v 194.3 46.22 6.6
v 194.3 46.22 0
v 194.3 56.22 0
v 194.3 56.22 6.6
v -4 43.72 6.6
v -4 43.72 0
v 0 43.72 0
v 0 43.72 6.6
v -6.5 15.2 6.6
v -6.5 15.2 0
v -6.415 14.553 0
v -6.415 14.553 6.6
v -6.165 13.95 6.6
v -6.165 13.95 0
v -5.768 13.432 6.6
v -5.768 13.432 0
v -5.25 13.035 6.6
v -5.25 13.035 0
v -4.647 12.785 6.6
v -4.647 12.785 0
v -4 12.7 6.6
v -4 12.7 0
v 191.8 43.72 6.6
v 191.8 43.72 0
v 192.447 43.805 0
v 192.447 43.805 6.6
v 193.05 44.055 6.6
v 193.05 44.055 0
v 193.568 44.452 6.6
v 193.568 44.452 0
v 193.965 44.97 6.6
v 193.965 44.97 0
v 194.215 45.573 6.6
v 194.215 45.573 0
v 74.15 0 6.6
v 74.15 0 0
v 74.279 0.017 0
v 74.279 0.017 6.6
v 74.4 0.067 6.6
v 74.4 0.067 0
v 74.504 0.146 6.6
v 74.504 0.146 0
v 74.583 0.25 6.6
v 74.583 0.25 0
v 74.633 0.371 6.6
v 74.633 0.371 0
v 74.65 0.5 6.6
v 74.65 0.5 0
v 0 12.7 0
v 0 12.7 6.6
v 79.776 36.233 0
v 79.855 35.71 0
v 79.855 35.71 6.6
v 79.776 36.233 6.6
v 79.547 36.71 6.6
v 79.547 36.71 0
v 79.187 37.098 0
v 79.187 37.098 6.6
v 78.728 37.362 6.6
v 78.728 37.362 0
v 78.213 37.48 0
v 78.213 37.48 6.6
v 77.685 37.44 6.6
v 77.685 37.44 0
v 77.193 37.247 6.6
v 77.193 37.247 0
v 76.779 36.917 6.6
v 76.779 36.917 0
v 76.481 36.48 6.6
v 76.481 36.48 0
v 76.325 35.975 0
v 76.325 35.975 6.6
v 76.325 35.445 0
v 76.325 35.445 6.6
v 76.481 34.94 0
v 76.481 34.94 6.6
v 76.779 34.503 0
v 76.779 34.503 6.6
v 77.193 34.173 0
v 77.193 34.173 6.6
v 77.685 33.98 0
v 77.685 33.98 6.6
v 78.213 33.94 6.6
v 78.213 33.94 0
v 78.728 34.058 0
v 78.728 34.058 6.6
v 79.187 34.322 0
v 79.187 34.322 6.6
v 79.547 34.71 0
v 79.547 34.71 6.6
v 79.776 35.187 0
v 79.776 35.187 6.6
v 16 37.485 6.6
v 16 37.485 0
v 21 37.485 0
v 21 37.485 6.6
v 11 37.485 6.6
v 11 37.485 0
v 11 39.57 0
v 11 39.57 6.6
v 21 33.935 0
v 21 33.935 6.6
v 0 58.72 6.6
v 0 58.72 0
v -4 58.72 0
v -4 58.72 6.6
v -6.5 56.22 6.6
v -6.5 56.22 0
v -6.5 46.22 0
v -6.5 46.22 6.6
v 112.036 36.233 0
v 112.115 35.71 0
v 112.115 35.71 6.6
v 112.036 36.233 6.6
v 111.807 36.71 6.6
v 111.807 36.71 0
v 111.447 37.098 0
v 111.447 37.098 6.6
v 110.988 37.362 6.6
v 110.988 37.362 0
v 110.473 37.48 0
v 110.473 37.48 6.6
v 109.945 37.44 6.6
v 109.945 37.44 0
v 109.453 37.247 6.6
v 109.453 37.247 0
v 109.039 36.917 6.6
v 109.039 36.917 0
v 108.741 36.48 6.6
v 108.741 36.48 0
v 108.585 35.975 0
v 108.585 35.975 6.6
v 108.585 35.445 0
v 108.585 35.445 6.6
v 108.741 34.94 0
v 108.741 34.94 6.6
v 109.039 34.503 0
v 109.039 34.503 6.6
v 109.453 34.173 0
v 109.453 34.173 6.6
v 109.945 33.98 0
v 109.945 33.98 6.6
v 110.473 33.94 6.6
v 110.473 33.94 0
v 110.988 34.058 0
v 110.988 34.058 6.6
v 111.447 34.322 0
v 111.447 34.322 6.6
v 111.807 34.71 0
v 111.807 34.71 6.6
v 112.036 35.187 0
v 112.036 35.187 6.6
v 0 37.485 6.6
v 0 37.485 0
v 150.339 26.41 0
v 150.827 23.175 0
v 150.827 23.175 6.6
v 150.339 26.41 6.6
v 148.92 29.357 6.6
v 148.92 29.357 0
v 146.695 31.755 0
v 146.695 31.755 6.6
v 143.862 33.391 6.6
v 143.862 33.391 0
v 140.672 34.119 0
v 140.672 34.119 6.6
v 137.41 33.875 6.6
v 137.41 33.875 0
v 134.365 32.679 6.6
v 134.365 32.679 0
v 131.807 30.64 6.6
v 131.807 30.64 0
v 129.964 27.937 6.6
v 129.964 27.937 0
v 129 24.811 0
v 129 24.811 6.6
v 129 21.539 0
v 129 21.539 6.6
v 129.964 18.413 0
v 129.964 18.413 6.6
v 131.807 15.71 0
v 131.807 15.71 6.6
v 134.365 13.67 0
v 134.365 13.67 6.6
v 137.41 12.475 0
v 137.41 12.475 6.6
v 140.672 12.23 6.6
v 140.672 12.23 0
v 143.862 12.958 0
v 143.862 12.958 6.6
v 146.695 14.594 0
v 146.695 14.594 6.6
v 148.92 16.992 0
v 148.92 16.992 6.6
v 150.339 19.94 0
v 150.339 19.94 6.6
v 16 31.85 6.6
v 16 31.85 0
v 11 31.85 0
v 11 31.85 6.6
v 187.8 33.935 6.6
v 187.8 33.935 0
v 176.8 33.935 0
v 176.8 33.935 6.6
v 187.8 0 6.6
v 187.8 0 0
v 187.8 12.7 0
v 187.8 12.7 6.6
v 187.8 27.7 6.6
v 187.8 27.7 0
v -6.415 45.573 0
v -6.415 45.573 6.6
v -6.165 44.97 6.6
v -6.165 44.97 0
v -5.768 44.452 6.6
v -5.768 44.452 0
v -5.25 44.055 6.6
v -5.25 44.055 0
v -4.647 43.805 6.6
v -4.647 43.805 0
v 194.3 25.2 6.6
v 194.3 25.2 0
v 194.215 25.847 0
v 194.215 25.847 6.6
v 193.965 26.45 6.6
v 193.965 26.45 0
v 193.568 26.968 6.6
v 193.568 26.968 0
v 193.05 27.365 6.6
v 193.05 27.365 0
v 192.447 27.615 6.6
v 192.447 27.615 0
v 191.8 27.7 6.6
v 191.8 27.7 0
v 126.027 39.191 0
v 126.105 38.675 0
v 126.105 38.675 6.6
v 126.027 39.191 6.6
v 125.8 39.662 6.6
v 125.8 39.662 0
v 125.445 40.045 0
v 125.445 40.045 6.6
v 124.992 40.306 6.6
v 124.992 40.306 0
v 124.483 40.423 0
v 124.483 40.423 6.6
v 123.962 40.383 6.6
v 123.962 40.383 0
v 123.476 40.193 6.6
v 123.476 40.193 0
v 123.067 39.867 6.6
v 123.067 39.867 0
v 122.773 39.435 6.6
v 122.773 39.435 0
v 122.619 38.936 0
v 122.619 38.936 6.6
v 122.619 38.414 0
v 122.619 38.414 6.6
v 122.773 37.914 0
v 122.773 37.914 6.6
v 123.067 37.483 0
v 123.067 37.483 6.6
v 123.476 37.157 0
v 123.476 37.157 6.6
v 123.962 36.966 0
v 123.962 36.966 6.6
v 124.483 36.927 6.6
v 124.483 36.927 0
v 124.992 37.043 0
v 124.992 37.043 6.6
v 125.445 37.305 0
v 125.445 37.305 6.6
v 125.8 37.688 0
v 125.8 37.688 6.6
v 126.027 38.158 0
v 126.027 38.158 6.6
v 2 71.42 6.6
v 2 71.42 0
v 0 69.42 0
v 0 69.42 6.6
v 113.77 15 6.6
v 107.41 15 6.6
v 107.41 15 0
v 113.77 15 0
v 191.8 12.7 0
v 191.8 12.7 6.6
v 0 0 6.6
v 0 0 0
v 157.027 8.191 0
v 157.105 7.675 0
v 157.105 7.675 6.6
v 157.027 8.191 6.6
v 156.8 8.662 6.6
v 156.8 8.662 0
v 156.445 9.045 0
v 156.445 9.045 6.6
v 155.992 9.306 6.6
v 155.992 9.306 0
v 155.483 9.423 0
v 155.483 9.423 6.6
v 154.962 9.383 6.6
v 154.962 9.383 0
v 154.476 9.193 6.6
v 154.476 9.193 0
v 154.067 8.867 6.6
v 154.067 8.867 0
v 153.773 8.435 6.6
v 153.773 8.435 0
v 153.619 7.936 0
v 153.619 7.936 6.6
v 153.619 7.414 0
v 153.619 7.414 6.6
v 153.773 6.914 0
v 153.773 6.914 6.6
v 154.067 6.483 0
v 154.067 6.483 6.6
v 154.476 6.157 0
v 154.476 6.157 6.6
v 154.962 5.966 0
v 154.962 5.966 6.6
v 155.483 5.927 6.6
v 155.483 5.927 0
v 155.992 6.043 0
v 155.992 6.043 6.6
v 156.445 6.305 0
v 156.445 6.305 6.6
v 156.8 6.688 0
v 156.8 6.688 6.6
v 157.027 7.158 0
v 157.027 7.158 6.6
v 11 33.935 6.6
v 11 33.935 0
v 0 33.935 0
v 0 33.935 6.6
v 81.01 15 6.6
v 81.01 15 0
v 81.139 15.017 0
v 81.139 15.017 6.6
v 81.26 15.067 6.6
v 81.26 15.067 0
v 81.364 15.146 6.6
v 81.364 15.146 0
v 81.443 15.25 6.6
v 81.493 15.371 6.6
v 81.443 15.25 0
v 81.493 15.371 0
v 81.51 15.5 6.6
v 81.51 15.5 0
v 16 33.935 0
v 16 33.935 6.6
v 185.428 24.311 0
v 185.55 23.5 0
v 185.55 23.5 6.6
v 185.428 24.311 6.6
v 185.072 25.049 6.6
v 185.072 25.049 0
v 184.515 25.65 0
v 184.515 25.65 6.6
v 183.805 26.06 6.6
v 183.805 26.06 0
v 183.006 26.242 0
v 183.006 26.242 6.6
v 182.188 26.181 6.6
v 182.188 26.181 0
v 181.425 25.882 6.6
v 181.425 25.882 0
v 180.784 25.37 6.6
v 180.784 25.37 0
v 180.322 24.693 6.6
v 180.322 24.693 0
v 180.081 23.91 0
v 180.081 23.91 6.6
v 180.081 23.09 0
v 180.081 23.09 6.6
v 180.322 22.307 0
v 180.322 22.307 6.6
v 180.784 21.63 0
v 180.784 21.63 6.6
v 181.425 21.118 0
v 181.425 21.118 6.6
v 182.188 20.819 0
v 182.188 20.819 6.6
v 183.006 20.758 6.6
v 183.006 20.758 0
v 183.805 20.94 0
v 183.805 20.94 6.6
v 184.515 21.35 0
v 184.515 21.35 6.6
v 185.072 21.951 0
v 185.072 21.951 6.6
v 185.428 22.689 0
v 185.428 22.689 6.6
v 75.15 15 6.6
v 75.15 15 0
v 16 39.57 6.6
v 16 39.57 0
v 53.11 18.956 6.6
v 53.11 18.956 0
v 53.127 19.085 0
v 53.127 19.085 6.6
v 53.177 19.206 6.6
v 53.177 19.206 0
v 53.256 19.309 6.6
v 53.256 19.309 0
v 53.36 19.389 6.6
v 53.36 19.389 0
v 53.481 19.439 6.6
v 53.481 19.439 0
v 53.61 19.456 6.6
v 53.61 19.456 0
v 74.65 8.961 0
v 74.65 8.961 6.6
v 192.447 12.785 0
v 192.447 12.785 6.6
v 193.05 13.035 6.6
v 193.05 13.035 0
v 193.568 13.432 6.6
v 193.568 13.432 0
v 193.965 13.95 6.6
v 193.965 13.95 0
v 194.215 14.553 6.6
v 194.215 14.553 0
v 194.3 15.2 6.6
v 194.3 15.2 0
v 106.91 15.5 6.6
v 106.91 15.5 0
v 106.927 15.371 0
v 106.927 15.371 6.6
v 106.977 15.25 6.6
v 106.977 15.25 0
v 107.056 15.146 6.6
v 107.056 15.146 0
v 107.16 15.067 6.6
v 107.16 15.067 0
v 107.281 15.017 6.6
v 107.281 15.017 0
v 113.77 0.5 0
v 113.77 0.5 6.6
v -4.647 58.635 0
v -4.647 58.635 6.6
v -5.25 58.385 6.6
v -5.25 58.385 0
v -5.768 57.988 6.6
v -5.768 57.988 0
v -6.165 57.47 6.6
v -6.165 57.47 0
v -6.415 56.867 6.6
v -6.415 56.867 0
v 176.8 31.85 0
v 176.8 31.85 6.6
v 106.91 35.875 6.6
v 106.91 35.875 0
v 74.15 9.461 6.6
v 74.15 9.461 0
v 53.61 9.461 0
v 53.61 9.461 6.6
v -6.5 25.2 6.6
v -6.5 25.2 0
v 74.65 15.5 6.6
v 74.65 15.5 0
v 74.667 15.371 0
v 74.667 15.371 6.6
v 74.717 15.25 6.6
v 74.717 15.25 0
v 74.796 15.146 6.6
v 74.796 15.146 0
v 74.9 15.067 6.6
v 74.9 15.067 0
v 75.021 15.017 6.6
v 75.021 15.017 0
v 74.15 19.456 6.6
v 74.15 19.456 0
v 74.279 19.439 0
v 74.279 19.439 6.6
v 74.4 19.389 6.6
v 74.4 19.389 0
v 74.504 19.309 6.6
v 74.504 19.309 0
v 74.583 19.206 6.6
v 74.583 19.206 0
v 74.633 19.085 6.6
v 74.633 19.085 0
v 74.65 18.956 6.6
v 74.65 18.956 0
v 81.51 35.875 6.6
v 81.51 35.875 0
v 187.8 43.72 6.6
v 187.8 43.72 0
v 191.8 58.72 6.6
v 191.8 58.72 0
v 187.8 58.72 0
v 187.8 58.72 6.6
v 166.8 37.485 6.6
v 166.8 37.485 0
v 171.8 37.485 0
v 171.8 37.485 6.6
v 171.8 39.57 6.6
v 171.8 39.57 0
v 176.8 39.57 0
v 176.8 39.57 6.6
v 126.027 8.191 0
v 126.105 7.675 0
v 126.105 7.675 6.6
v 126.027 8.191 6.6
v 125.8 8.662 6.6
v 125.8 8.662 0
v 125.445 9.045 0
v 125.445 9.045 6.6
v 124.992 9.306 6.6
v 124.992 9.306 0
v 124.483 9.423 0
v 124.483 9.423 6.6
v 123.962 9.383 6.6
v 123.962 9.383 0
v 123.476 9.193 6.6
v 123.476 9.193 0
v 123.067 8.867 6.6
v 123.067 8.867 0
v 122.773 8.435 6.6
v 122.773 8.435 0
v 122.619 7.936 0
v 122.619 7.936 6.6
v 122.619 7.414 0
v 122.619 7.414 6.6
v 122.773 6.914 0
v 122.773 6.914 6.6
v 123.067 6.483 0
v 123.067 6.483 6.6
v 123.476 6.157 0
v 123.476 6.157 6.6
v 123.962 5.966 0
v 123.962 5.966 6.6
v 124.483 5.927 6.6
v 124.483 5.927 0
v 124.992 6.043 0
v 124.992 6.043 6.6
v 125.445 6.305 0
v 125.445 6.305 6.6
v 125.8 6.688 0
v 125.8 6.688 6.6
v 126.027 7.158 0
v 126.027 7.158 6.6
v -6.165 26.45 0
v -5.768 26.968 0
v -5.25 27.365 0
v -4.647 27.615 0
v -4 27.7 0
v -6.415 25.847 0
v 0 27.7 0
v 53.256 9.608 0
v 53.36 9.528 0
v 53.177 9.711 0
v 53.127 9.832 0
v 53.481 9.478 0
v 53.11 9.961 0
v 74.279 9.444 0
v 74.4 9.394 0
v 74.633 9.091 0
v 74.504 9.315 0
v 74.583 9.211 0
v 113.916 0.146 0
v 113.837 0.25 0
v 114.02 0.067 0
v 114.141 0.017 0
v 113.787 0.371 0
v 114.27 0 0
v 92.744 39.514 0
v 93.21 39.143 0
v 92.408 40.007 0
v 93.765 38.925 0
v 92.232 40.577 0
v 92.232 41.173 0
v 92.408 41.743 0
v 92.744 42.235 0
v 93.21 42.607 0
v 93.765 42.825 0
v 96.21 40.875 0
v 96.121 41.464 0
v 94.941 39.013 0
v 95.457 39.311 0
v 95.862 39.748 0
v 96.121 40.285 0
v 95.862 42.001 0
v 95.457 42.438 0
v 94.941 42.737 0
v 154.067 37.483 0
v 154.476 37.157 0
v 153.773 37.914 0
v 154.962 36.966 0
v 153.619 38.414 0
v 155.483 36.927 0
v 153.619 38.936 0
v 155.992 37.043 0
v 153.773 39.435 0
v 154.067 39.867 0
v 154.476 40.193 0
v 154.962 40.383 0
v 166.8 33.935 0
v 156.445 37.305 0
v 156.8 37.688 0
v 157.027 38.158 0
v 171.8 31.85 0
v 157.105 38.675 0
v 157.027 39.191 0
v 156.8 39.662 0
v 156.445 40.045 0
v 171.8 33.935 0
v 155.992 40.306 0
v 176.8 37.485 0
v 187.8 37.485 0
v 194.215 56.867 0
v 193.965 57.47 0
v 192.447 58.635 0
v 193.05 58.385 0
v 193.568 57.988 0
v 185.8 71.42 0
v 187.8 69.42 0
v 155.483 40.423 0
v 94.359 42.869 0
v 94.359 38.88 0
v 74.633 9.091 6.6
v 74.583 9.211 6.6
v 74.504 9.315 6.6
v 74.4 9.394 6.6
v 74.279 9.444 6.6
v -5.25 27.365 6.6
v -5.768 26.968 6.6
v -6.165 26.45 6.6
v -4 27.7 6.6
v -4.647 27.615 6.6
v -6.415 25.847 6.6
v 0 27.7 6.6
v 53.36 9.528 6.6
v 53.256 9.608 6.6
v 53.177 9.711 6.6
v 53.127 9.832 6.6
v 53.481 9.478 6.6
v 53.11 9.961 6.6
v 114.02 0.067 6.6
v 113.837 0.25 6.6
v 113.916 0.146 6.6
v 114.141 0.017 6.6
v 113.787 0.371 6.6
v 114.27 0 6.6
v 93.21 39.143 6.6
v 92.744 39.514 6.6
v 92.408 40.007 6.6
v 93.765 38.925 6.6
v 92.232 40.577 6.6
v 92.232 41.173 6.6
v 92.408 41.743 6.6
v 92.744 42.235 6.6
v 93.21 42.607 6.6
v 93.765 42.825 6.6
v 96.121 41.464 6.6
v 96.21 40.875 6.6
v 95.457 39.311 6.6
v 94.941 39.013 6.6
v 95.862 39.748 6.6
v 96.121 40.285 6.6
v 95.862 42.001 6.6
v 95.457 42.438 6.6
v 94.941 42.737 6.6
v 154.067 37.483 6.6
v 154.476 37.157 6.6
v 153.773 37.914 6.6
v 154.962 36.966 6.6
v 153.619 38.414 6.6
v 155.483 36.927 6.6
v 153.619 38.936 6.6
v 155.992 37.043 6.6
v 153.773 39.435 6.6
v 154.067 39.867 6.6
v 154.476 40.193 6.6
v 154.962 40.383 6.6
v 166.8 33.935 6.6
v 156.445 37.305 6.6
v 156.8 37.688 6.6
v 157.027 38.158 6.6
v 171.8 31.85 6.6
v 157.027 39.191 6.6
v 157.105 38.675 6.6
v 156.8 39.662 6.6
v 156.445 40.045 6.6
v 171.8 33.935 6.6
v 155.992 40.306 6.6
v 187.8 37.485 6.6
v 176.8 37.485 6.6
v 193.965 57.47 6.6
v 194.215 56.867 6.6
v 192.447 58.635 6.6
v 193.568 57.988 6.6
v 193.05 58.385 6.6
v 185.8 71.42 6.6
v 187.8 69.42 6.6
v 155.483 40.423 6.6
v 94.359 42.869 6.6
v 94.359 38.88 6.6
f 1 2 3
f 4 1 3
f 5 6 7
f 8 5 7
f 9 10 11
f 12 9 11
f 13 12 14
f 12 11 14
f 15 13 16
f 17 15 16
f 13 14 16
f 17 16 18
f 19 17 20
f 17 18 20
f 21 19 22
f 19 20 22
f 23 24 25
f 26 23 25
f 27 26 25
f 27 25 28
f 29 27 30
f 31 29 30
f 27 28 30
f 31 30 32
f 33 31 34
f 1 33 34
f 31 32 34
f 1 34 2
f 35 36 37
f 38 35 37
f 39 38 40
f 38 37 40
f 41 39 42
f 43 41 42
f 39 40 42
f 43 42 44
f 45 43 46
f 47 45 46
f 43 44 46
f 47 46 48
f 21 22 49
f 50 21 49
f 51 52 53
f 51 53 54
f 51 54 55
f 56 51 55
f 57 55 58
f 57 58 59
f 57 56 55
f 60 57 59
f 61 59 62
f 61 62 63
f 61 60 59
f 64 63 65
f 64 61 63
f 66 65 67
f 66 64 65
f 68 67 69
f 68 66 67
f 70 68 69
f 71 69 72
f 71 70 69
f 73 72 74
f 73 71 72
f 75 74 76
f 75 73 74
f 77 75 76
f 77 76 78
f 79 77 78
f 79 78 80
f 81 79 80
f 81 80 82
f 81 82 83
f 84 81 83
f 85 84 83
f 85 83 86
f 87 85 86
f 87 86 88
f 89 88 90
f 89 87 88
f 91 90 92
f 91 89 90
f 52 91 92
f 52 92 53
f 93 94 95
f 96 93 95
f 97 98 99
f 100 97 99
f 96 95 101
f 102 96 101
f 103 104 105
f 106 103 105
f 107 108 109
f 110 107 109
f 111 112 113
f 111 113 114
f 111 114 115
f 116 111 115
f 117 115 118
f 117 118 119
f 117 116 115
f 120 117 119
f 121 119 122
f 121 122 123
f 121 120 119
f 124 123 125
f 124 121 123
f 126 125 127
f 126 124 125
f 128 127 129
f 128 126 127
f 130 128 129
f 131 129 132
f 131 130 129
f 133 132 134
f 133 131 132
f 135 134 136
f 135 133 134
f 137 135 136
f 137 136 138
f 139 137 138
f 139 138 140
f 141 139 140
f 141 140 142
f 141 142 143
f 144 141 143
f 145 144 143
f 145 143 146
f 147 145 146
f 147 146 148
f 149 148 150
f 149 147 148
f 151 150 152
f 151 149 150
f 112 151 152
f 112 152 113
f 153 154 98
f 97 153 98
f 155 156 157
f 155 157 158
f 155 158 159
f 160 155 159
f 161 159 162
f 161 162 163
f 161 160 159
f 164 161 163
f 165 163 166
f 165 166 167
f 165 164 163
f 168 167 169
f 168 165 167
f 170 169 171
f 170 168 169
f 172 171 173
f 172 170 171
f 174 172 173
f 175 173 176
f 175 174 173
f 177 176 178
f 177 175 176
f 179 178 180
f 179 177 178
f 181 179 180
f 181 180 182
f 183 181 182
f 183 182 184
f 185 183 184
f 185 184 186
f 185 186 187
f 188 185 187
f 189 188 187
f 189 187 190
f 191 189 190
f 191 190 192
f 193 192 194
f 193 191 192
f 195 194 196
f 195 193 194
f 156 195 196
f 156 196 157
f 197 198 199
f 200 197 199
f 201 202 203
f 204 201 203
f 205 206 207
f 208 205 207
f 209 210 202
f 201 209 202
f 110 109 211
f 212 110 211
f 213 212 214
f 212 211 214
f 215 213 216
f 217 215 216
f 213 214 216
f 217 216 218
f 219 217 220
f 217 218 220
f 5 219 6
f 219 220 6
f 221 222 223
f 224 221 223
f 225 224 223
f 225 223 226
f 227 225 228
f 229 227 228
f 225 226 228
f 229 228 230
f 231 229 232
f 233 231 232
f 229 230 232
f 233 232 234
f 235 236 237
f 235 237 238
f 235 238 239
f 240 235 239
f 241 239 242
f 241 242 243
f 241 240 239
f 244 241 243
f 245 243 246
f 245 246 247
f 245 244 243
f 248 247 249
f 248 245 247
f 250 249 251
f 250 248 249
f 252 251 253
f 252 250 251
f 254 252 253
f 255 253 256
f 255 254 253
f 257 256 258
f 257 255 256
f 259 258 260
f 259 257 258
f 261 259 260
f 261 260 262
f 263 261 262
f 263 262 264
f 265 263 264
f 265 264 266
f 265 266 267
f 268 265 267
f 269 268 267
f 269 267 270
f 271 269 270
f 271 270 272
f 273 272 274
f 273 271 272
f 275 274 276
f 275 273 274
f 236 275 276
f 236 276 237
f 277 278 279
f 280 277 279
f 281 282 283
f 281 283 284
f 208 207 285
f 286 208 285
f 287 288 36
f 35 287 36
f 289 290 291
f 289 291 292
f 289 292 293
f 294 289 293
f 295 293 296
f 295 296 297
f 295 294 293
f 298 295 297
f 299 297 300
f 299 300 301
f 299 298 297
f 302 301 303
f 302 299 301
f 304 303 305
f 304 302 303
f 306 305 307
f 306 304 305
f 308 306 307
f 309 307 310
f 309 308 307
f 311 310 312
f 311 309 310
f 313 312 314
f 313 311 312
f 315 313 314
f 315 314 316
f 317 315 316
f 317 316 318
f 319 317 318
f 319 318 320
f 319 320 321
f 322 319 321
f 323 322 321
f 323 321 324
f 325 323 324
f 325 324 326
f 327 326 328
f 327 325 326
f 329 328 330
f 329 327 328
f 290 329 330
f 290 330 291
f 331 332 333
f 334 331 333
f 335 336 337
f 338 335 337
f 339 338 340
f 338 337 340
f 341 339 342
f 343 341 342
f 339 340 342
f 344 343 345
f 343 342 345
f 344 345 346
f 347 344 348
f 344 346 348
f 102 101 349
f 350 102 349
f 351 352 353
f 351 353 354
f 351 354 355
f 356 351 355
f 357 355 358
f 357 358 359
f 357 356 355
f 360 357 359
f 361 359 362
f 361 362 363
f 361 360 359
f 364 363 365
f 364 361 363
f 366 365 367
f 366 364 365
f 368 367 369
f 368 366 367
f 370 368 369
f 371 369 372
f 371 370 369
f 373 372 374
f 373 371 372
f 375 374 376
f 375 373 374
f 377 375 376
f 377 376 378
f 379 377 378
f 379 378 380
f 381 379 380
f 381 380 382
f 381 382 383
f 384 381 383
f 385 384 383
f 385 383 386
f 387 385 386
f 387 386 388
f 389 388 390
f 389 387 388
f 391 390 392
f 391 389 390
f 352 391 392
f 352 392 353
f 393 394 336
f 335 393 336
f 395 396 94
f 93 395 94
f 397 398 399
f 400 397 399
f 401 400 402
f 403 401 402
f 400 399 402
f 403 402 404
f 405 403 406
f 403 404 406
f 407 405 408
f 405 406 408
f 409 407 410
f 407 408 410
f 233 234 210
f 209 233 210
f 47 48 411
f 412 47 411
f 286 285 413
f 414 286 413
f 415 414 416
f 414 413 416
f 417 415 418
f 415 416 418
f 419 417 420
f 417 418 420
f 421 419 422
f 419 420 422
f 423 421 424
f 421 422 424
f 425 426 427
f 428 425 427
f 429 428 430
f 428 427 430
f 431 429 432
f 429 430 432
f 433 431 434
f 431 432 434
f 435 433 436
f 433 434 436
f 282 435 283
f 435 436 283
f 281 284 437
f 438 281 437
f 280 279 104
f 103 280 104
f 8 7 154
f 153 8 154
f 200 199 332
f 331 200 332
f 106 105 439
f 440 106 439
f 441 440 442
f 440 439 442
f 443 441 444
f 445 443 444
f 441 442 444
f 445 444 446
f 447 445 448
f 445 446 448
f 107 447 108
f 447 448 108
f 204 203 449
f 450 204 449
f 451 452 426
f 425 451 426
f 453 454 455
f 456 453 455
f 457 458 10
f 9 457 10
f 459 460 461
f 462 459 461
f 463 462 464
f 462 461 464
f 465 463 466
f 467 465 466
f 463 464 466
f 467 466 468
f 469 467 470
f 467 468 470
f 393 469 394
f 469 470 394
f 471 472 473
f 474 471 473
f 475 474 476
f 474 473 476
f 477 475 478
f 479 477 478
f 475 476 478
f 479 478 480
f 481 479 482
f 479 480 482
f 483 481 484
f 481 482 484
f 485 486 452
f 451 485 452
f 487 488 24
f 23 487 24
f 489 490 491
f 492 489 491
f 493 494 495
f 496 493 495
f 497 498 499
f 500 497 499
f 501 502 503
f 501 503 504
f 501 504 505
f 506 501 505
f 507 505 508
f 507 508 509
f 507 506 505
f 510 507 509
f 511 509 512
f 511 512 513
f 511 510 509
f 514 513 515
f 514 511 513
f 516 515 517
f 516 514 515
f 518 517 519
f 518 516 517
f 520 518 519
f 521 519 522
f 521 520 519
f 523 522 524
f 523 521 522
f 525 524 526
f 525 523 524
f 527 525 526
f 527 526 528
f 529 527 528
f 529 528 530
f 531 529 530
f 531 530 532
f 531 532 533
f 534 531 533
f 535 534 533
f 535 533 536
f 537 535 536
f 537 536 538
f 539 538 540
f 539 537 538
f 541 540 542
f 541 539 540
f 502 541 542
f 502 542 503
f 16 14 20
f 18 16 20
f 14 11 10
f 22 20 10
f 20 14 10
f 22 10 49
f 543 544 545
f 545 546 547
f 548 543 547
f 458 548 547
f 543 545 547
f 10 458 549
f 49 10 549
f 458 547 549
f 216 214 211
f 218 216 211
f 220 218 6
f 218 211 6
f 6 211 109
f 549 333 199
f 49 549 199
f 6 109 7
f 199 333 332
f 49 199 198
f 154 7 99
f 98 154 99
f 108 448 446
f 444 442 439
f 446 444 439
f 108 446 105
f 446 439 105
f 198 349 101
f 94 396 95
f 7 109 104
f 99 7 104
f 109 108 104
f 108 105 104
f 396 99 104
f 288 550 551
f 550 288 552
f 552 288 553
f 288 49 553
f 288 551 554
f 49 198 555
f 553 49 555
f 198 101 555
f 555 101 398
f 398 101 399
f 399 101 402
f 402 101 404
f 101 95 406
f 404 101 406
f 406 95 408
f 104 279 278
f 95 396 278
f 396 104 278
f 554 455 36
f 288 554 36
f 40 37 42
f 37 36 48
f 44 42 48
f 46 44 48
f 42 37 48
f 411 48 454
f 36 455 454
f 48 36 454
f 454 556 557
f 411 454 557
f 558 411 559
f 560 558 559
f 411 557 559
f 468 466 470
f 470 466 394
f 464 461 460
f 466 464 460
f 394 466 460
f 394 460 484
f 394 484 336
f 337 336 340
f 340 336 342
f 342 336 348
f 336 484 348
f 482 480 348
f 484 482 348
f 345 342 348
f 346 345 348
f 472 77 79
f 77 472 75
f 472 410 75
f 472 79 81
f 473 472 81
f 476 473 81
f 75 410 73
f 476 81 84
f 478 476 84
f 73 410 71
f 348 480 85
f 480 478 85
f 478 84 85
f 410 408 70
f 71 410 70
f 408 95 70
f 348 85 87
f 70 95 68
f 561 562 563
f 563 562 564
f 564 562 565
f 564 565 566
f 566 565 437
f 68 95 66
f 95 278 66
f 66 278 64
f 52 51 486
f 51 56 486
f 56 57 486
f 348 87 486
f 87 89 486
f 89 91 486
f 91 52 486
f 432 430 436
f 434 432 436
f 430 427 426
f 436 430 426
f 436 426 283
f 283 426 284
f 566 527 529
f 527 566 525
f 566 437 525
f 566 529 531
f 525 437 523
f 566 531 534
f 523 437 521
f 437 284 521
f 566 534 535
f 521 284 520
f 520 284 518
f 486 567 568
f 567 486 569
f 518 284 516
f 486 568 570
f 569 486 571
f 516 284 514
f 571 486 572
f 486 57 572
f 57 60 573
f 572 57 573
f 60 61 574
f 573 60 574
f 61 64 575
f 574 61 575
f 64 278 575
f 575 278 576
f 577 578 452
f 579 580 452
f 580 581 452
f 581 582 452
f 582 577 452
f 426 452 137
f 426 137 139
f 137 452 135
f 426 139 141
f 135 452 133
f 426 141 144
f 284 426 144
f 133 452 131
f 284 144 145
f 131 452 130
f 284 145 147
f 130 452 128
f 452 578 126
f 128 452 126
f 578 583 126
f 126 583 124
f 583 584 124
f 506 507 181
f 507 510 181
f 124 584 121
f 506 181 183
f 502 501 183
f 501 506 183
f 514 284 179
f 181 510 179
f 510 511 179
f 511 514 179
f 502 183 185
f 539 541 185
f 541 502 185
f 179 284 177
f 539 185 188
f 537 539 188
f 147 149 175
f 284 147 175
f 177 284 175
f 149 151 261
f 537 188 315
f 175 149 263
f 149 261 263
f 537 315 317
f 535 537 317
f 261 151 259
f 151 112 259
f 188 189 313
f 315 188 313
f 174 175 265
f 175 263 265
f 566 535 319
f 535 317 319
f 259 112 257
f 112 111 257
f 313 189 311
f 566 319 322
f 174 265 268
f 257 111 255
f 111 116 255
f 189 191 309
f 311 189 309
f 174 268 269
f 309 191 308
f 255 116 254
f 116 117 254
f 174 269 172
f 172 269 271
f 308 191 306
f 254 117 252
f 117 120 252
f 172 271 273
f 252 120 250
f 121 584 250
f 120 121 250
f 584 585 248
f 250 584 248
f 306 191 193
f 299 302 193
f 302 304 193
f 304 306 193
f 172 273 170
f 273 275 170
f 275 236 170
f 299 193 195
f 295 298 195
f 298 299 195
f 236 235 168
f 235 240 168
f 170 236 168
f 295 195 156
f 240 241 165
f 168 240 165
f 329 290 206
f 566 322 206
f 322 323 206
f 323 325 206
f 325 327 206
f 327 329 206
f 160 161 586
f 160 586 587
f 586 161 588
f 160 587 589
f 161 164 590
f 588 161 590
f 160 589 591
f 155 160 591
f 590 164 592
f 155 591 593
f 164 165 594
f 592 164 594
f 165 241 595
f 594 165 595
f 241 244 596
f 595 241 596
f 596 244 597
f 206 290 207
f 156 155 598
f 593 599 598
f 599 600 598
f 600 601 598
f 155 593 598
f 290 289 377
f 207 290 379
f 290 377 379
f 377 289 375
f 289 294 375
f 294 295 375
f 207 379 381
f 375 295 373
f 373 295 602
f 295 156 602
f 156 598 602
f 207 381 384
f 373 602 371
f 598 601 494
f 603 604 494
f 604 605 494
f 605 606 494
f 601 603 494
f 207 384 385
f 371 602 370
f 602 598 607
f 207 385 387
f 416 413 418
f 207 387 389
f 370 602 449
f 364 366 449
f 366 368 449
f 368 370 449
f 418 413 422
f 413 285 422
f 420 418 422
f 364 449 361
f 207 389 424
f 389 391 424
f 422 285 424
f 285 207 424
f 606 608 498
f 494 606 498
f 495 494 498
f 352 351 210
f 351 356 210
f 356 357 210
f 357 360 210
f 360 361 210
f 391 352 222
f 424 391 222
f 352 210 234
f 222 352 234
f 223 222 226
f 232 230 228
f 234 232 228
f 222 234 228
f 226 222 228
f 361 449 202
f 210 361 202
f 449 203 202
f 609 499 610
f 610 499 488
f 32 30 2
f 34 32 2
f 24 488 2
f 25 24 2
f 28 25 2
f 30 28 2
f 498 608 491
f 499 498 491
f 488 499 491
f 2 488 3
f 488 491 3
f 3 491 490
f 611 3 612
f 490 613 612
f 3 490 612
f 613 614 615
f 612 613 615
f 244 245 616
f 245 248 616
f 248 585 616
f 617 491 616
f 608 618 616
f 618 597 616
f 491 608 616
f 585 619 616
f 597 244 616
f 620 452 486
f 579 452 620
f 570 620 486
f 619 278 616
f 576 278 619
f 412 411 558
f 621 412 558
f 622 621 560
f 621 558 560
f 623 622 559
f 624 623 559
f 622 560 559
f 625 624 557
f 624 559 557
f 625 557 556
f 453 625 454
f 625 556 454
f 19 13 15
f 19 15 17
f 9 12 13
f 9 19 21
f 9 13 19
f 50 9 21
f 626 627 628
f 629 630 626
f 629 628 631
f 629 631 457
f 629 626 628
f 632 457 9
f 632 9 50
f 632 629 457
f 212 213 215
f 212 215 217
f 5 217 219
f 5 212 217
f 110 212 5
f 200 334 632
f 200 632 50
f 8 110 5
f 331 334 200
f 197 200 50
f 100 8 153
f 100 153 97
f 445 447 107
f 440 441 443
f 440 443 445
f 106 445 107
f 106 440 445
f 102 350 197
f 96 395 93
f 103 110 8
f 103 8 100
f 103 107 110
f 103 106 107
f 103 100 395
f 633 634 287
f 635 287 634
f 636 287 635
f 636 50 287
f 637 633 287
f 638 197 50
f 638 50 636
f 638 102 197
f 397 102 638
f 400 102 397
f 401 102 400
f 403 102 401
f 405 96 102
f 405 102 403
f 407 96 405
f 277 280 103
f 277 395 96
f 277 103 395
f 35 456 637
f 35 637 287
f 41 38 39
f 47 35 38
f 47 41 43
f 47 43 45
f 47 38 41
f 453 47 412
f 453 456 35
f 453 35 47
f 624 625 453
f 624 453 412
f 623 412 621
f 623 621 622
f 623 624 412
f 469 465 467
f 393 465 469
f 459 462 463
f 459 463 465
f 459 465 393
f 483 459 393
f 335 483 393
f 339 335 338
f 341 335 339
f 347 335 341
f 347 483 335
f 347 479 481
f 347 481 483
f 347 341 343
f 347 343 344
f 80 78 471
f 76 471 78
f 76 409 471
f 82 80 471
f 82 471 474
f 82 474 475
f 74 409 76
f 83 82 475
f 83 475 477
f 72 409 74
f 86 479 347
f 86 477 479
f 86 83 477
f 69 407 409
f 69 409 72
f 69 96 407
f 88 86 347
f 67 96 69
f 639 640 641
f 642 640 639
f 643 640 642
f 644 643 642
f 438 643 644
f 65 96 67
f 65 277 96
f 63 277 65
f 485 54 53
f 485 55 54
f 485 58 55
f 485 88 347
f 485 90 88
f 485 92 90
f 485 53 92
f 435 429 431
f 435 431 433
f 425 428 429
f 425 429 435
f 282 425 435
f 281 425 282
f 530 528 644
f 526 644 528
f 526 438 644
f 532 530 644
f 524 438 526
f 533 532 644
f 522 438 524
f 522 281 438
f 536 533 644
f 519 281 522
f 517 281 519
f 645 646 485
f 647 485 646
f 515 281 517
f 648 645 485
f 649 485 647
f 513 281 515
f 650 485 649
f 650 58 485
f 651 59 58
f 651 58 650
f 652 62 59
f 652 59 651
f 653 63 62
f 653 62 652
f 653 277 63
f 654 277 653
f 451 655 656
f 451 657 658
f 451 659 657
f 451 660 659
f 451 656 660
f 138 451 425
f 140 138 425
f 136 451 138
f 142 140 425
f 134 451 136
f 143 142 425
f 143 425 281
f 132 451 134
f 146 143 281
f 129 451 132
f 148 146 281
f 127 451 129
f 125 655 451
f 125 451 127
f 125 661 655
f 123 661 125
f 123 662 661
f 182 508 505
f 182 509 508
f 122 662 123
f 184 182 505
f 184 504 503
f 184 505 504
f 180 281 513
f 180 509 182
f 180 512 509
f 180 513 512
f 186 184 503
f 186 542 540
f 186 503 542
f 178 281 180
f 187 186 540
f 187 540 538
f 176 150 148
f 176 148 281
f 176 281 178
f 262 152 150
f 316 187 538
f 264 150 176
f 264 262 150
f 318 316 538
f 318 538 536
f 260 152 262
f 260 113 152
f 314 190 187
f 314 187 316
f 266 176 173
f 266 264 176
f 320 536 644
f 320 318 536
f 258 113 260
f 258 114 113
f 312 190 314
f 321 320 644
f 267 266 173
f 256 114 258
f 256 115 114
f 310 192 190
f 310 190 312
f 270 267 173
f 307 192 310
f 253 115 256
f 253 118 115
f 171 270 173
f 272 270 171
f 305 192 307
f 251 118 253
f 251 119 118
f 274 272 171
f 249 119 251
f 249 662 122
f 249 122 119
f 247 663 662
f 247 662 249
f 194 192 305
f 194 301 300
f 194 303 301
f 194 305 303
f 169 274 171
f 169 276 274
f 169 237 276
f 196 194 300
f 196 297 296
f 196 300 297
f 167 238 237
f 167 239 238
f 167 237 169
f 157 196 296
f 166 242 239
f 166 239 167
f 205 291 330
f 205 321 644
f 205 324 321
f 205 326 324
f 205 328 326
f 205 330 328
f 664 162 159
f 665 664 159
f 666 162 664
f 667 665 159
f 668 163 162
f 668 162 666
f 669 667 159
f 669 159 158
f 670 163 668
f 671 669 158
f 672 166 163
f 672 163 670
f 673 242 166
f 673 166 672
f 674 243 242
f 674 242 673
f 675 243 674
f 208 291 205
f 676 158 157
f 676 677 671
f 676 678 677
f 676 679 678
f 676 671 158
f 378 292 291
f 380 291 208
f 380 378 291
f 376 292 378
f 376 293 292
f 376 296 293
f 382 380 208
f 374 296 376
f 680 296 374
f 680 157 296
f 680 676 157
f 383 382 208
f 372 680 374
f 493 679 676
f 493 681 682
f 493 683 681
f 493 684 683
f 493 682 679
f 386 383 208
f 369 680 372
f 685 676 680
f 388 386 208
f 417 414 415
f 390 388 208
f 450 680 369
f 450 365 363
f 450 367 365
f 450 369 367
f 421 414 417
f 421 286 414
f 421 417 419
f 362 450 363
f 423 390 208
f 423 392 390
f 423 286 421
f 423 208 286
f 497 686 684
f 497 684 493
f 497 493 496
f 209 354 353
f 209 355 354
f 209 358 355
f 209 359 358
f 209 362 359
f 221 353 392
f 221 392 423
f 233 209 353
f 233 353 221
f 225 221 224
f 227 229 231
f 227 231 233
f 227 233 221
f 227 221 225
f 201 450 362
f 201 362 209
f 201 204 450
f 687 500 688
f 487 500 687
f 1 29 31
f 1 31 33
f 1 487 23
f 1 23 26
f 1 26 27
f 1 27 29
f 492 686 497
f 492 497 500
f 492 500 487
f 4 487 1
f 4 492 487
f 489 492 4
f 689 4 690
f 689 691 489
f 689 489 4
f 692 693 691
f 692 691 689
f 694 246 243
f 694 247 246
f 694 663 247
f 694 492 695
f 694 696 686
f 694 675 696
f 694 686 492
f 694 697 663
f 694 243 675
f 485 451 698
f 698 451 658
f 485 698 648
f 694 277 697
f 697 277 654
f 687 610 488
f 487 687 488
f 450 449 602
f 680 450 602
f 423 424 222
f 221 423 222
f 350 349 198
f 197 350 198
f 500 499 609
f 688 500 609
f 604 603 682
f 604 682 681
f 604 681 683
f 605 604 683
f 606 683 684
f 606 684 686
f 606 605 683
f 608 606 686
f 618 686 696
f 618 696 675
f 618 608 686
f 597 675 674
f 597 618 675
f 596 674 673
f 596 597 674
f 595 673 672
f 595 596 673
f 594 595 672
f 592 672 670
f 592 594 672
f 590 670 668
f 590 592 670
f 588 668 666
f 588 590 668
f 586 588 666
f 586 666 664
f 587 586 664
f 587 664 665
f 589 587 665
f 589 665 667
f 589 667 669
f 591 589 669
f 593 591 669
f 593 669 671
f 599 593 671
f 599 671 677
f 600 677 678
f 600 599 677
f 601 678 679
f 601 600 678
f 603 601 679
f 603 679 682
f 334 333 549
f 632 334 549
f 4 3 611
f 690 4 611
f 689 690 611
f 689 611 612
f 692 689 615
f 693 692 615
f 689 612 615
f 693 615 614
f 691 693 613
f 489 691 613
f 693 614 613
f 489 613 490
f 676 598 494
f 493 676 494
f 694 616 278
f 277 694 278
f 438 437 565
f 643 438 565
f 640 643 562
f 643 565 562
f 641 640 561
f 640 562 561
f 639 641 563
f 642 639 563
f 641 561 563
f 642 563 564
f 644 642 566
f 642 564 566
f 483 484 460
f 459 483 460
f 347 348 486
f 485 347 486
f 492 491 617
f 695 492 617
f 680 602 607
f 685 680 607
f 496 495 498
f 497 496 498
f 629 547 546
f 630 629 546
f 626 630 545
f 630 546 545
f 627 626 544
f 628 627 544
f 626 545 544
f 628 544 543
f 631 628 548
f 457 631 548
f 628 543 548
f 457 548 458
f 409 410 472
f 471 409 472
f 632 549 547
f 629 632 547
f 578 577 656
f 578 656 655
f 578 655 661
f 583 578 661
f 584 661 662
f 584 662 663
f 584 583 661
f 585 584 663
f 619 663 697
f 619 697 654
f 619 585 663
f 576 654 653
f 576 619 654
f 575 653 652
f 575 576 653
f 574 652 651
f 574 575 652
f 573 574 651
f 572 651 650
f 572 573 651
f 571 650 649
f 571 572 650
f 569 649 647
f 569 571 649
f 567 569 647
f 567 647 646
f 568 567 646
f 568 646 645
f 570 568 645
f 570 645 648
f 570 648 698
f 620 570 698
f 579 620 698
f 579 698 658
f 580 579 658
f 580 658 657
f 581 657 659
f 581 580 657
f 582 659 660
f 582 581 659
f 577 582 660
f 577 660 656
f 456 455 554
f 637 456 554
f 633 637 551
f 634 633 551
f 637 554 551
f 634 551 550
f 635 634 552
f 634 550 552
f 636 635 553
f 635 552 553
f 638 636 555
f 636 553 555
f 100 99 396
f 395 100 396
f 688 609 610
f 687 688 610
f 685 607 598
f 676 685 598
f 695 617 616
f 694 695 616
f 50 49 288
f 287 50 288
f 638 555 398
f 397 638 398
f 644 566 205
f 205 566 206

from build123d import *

# Parameters (mm, degrees)
MODEL_R             = 1.7526
MODEL_R_2           = 10.975
MODEL_R_3           = 2
MODEL_R_4           = 2.75
MODEL_R_5           = 1.775
BOSS_EXTRUDE1_DEPTH = 6.6


with BuildPart() as part:
    # Model → Boss-Extrude1 (new body)
    with BuildSketch(Plane.XY):
        with BuildLine():
            Line((0, 0), (74.150001665, 0))
            ThreePointArc((74.150001665, 0), (74.503555056, 0.146446609), (74.650001665, 0.5))
            Line((74.650001665, 0.5), (74.650001665, 8.9613))
            ThreePointArc((74.650001665, 8.9613), (74.503555056, 9.314853391), (74.150001665, 9.4613))
            Line((74.150001665, 9.4613), (53.610001665, 9.4613))
            ThreePointArc((53.610001665, 9.4613), (53.256448274, 9.607746609), (53.110001665, 9.9613))
            Line((53.110001665, 9.9613), (53.110001665, 18.9557))
            ThreePointArc((53.110001665, 18.9557), (53.256448274, 19.309253391), (53.610001665, 19.4557))
            Line((53.610001665, 19.4557), (74.150001665, 19.4557))
            ThreePointArc((74.150001665, 19.4557), (74.503555056, 19.309253391), (74.650001665, 18.9557))
            Line((74.650001665, 18.9557), (74.650001665, 15.5))
            ThreePointArc((74.650001665, 15.5), (74.796448274, 15.146446609), (75.150001665, 15))
            Line((75.150001665, 15), (81.010001665, 15))
            ThreePointArc((81.010001665, 15), (81.363555056, 15.146446609), (81.510001665, 15.5))
            Line((81.510001665, 15.5), (81.510001665, 35.87480678))
            Line((81.510001665, 35.87480678), (106.910001664, 35.87480678))
            Line((106.910001664, 35.87480678), (106.910001664, 15.5))
            ThreePointArc((106.910001664, 15.5), (107.056448274, 15.146446609), (107.410001664, 15))
            Line((107.410001664, 15), (113.770001664, 15))
            Line((113.770001664, 15), (113.770001664, 0.5))
            ThreePointArc((113.770001664, 0.5), (113.916448274, 0.146446609), (114.270001664, 0))
            Line((114.270001664, 0), (187.8, 0))
            Line((187.8, 0), (187.8, 12.7))
            Line((187.8, 12.7), (191.8, 12.7))
            ThreePointArc((191.8, 12.7), (193.567766953, 13.432233047), (194.3, 15.2))
            Line((194.3, 15.2), (194.3, 25.2))
            ThreePointArc((194.3, 25.2), (193.567766953, 26.967766953), (191.8, 27.7))
            Line((191.8, 27.7), (187.8, 27.7))
            Line((187.8, 27.7), (187.8, 33.935))
            Line((187.8, 33.935), (176.8, 33.935))
            Line((176.8, 33.935), (176.8, 31.85))
            Line((176.8, 31.85), (171.8, 31.85))
            Line((171.8, 31.85), (171.8, 33.935))
            Line((171.8, 33.935), (166.8, 33.935))
            Line((166.8, 33.935), (166.8, 37.485))
            Line((166.8, 37.485), (171.8, 37.485))
            Line((171.8, 37.485), (171.8, 39.57))
            Line((171.8, 39.57), (176.8, 39.57))
            Line((176.8, 39.57), (176.8, 37.485))
            Line((176.8, 37.485), (187.8, 37.485))
            Line((187.8, 37.485), (187.8, 43.72))
            Line((187.8, 43.72), (191.8, 43.72))
            ThreePointArc((191.8, 43.72), (193.567766953, 44.452233047), (194.3, 46.22))
            Line((194.3, 46.22), (194.3, 56.22))
            ThreePointArc((194.3, 56.22), (193.567766953, 57.987766953), (191.8, 58.72))
            Line((191.8, 58.72), (187.8, 58.72))
            Line((187.8, 58.72), (187.8, 69.42))
            Line((187.8, 69.42), (185.8, 71.42))
            Line((185.8, 71.42), (2, 71.42))
            Line((2, 71.42), (0, 69.42))
            Line((0, 69.42), (0, 58.72))
            Line((0, 58.72), (-4, 58.72))
            ThreePointArc((-4, 58.72), (-5.767766953, 57.987766953), (-6.5, 56.22))
            Line((-6.5, 56.22), (-6.5, 46.22))
            ThreePointArc((-6.5, 46.22), (-5.767766953, 44.452233047), (-4, 43.72))
            Line((-4, 43.72), (0, 43.72))
            Line((0, 43.72), (0, 37.485))
            Line((0, 37.485), (11, 37.485))
            Line((11, 37.485), (11, 39.57))
            Line((11, 39.57), (16, 39.57))
            Line((16, 39.57), (16, 37.485))
            Line((16, 37.485), (21, 37.485))
            Line((21, 37.485), (21, 33.935))
            Line((21, 33.935), (16, 33.935))
            Line((16, 33.935), (16, 31.85))
            Line((16, 31.85), (11, 31.85))
            Line((11, 31.85), (11, 33.935))
            Line((11, 33.935), (0, 33.935))
            Line((0, 33.935), (0, 27.7))
            Line((0, 27.7), (-4, 27.7))
            ThreePointArc((-4, 27.7), (-5.767766953, 26.967766953), (-6.5, 25.2))
            Line((-6.5, 25.2), (-6.5, 15.2))
            ThreePointArc((-6.5, 15.2), (-5.767766953, 13.432233047), (-4, 12.7))
            Line((-4, 12.7), (0, 12.7))
            Line((0, 12.7), (0, 0))
        make_face()
        with Locations((155.352001664, 38.674806781)):
            Circle(MODEL_R, mode=Mode.SUBTRACT)
        with Locations((155.352001664, 7.674806781)):
            Circle(MODEL_R, mode=Mode.SUBTRACT)
        with Locations((124.352001664, 38.674806781)):
            Circle(MODEL_R, mode=Mode.SUBTRACT)
        with Locations((124.352001664, 7.674806781)):
            Circle(MODEL_R, mode=Mode.SUBTRACT)
        with Locations((139.852001664, 23.174806781)):
            Circle(MODEL_R_2, mode=Mode.SUBTRACT)
        with Locations((94.210001665, 40.87480678)):
            Circle(MODEL_R_3, mode=Mode.SUBTRACT)
        with Locations((182.8, 23.5)):
            Circle(MODEL_R_4, mode=Mode.SUBTRACT)
        with Locations((110.340001664, 35.71)):
            Circle(MODEL_R_5, mode=Mode.SUBTRACT)
        with Locations((78.080001665, 35.71)):
            Circle(MODEL_R_5, mode=Mode.SUBTRACT)
    extrude(amount=BOSS_EXTRUDE1_DEPTH)


solid = part.part
